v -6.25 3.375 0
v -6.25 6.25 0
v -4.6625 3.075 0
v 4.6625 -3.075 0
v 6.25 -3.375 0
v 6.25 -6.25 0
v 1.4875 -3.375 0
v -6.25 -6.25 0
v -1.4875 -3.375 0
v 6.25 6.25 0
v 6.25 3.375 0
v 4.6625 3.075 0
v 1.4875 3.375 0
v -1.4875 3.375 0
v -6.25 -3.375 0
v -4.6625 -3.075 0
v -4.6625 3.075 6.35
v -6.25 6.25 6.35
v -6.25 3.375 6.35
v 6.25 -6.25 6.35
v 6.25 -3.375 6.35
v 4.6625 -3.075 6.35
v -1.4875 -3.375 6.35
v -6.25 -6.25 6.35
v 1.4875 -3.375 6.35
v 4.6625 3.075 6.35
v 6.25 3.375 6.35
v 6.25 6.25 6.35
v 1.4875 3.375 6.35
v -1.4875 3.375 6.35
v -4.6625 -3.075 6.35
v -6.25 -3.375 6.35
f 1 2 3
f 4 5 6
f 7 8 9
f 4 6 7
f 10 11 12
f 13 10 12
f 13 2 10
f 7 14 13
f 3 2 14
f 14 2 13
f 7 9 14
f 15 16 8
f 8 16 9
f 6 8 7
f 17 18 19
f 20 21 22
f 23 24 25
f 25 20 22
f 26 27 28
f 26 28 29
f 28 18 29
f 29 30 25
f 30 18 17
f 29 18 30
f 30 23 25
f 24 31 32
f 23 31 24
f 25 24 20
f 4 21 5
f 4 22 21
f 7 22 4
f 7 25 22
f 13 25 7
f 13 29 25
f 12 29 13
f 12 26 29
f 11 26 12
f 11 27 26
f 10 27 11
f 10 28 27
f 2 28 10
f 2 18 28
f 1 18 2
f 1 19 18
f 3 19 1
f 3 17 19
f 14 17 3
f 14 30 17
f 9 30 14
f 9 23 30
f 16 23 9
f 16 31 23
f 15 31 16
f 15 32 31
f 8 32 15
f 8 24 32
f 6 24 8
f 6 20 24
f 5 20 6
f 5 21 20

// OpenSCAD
// file: ../lib/TOGUnitTable-v1.scad
// TOGUnitTable-v1.1.0 - Library for handling 'complex amounts' in the form of [multiplier, unit name], e.g. [1.5, "inch"]
//
// 2023-07-01: the following 'annotation' is something I just made up,
// but is intended as a way for future packaging tools to know that it's 'safe'
// (because everything has been somewhat namespaced) to turn a `use <x>`
// into an `include <x>`, making it inlinable:
// safe-to-include: true
// 
// Versions:
// v1.0.0:
// - Created it.
// v1.1.0:
// - Add optional 'dbgctxstr' parameter to unit decoding functions, for better error messages
// 
// Naming convention:
// Doing 'OO without classes', here.
// Fully qualified name = class or package name + "__" + member name
// Class or package name may itself be namespaced, and class names may double as package names.
// Here, tog_unittable names both a class and a package.

// Demo unit table uses 'micrometer' as the base unit
// in order to keep multipliers as integers as much as possible.
tog_unittable__demo_unit_table = [
	["um",    [    1   ,   "um"], "micrometer" ],
	["mm",    [ 1000   ,   "um"], "millimeter" ],
	["inch",  [25400   ,   "um"], "inch"       ],
	["u",     [    1/16, "inch"], "model unit" ], // As used by TGx9 et al
	["atom",  [    8   ,    "u"], "model atom" ],
	["chunk", [    3   , "atom"], "model chunk"],
];

use <./DbgCtxStrLib1.scad>

function tog_unittable__list__filter(list, predicate) = [
	for( item=list ) if( predicate(item) ) item
];
function tog_unittable__list__first(list, on_error) =
	len(list) > 0 ? list[0] : on_error();

function tog_unittable__unit_value_ca(unit_table, unit_name, dbgctxstr=undef) =
	tog_unittable__list__first(
		tog_unittable__list__filter(unit_table, function (entry) entry[0] == unit_name),
		function () assert(false,
			str("Did not find entry for unit '", unit_name, "' in unit table", dbgctxstr_errmsg_suffix(dbgctxstr))
		)
	)[1];

function tog_unittable__ca__is_valid( ca ) =
	is_list(ca) && len(ca) == 2;

// Break down 'amount' until it is in a base unit (one which is defined in terms of itself)
function tog_unittable__simplify_ca(unit_table, amount, dbgctxstr=undef) =
	assert( tog_unittable__ca__is_valid(amount), str(amount, " is not a valid Complex Amount (should be [numeric_value, \"unit_name\"])", dbgctxstr=dbgctxstr) )
	let( unit_value_ca = tog_unittable__unit_value_ca(unit_table, amount[1], dbgctxstr=dbgctxstr) )
	unit_value_ca[1] == amount[1] ? amount :
		tog_unittable__simplify_ca(unit_table, [amount[0] * unit_value_ca[0], unit_value_ca[1]]);

function tog_unittable__divide_ca(unit_table, numerator, denominator, dbgctxstr=undef) =
	let(
		numerator_base_ca   = tog_unittable__simplify_ca(unit_table, numerator, dbgctxstr=dbgctxstr),
		denominator_base_ca = tog_unittable__simplify_ca(unit_table, denominator, dbgctxstr=dbgctxstr)
	)
	assert(numerator_base_ca[1] == denominator_base_ca[1], str("Different base units found for ", numerator[1], " and ", denominator[1]))
	numerator_base_ca[0] / denominator_base_ca[0];	

assert(tog_unittable__divide_ca(tog_unittable__demo_unit_table, [1,   "mm"], [  1, "mm"]) ==     1   );
assert(tog_unittable__divide_ca(tog_unittable__demo_unit_table, [1,   "mm"], [  1, "um"]) ==  1000   );
assert(tog_unittable__divide_ca(tog_unittable__demo_unit_table, [1, "inch"], [  1, "um"]) == 25400   );
assert(tog_unittable__divide_ca(tog_unittable__demo_unit_table, [1, "inch"], [  1, "mm"]) ==    25.4 );
assert(tog_unittable__divide_ca(tog_unittable__demo_unit_table, [1, "inch"], [254, "um"]) ==   100   );
assert(tog_unittable__divide_ca(tog_unittable__demo_unit_table, [1,    "u"], [  1, "um"]) ==  1587.5 );
// file: ../lib/TOGStringLib1.scad
// TOGStringLib1.7
// 
// Functions for parsing quantities
// and other misc. string handling.
// 
// v1.5
// - togstr1_parse_quantity will treat unit-only strings as meaning 1/1 of that unit.
//   e.g. togstr1_parse_quantity("foot") = [[[1,1], "foot", 4]]
// v1.6:
// - togstr1_parse_quantity allows unit name to be omitted when quantity is zero and $togunits1_default_unit is defined
// v1.7:
// - Add optional 'dbgctxstr' parameter to unit decoding functions, for better error messages
// 
// Globals: $togunits1_default_unit - affects what 'unit' is returned
// when interpreting numbers or strings that lack the unit.


function togstr1__todo(message) = assert(false, str("TODO: ", message));

module togstr1__assert_eq(a, b) {
	if( a != b ) {
		assert( a == b, str(a, " != ", b) );
	}
}



function togstr1_slice(source, i0, i1) =
	i0 == i1 ? "" :
	str(source[i0], togstr1_slice(source, i0+1, i1));

function togstr1_tokenize(source, sep, maxcount=9999, i=0, tokenstart=0) =
	len(source) == i ? (
		(tokenstart < i) ? [togstr1_slice(source, tokenstart, i)] : []
	) :
	source[i] == sep ? (
		(tokenstart < i) ? concat([togstr1_slice(source, tokenstart, i)], togstr1_tokenize(source, sep, maxcount-1, i+1, i+1)) :
		togstr1_tokenize(source, sep, maxcount, i+1, i+1)
	) :
	maxcount <= 1 ? [togstr1_slice(source, tokenstart, len(source))] :
	togstr1_tokenize(source, sep, maxcount, i+1, tokenstart);

togstr1__assert_eq( ["foo","bar","baz"], togstr1_tokenize("foo-bar-baz", "-") );
// Duplicate delimiters are ignored
togstr1__assert_eq( ["foo","bar","baz"], togstr1_tokenize("foo--bar--baz", "-") );
// Trailing delimiters are ignored
togstr1__assert_eq( ["foo","bar","baz"], togstr1_tokenize("foo--bar--baz--", "-") );
// Leading delimiters are ignored
togstr1__assert_eq( ["foo","bar","baz"], togstr1_tokenize("--foo--bar--baz", "-") );
// Can limit number of tokens returned
togstr1__assert_eq( ["foo","bar-baz"], togstr1_tokenize("foo-bar-baz", "-", 2) );
togstr1__assert_eq( ["foo","bar-baz"], togstr1_tokenize("--foo--bar-baz", "-", 2) );
togstr1__assert_eq( ["foo","bar--baz"], togstr1_tokenize("--foo--bar--baz", "-", 2) );
togstr1__assert_eq( ["foo"], togstr1_tokenize("--foo--", "-", 2) );




/** \d+ -> [num, end_index] */
function togstr1_parse_decimal_nat(str, index=0, current=0, dbgctxstr=undef) =
	len(str) == index ? [current, index] :
	let( dig = ord(str[index]) - ord("0") )
	(dig >= 0 && dig <= 9) ? togstr1_parse_decimal_nat(str, index+1, current*10 + dig, dbgctxstr=dbgctxstr) :
	[current, index];

togstr1__assert_eq( [123,3], togstr1_parse_decimal_nat("123") );
togstr1__assert_eq( [123,3], togstr1_parse_decimal_nat("123.45") );

/** [+-]*\d+ ->  [[num, den], end_index] */
function togstr1_parse_decimal_number(str, index=0, dbgctxstr=undef) =
	str[index] == "+" ? togstr1_parse_decimal_number(str, index+1) :
	str[index] == "-" ? let(r=togstr1_parse_decimal_number(str, index+1)) [[-r[0][0], r[0][1]], r[1]] :
	let(r = togstr1_parse_decimal_nat(str, index, dbgctxstr=dbgctxstr))
	str[r[1]] != "." ? [[r[0], 1], r[1]] :
	let(fracr = togstr1_parse_decimal_nat(str, r[1]+1))
	let(mult = pow(10, fracr[1]-(r[1]+1)))
	[[r[0]*mult + fracr[0], mult], fracr[1]];

togstr1__assert_eq( [[   36,   1], 2], togstr1_parse_decimal_number( "36"   ) );
togstr1__assert_eq( [[ 3524, 100], 5], togstr1_parse_decimal_number( "35.24") );
togstr1__assert_eq( [[-3524, 100], 6], togstr1_parse_decimal_number("-35.24") );
togstr1__assert_eq( [[    0,   1], 0], togstr1_parse_decimal_number( "NotANumber") );

function togstr1__gcd(a, b) = b == 0 ? abs(a) : togstr1__gcd(b, a % b);

togstr1__assert_eq(10, togstr1__gcd(10, 20));
togstr1__assert_eq( 5, togstr1__gcd(10, 15));
togstr1__assert_eq( 2, togstr1__gcd(10, 14));


function togstr1__normalize_rat(rat) =
	let(gcd = togstr1__gcd(rat[0], rat[1]))
	// TODO: find LCD, divide top and bottom by it
	rat[0] < 0 && rat[1] < 0 ? [-rat[0]/gcd, -rat[1]/gcd] :
	[rat[0]/gcd, rat[1]/gcd];

/** <decnum>[/<decnum>] -> [[num, den], end_index] */
function togstr1__multiply_rat(a, b) =
	togstr1__normalize_rat(
		a[1] == b[1] ? [a[0]*b[0]/a[1], a[1]] : // TODO: LCD instead of special case
		[a[0]*b[0], a[1]*b[1]]
	);
function togstr1__divide_rat(a, b) = togstr1__normalize_rat([a[0]*b[1], a[1]*b[0]]);


function togstr1__add_rat(a, b) =
	togstr1__normalize_rat([a[0]*b[1] + b[0]*a[1], a[1]*b[1]]);
	
togstr1__assert_eq([1, 2], togstr1__add_rat([1, 3], [1, 6]));


/** Return [[num, den], end_index] */
function togstr1_parse_rational_number(str, index=0, dbgctxstr=undef) =
	let( numr = togstr1_parse_decimal_number(str, index, dbgctxstr=dbgctxstr) )
	str[numr[1]] == "+" ?
		let(numrb = togstr1_parse_rational_number(str, numr[1]+1, dbgctxstr=dbgctxstr))
		[togstr1__add_rat(numr[0], numrb[0]), numrb[1]]	:
	str[numr[1]] == "/" ?
		let( denr = togstr1_parse_decimal_number(str, numr[1]+1, dbgctxstr=dbgctxstr) )
		[togstr1__divide_rat(numr[0], denr[0]), denr[1]] :
	numr;

togstr1__assert_eq( [[   123,  1],3], togstr1_parse_rational_number( "123") );
togstr1__assert_eq( [[   123,  1],4], togstr1_parse_rational_number("+123") );
togstr1__assert_eq( [[-  123,  1],4], togstr1_parse_rational_number("-123") );
togstr1__assert_eq( [[   123,  1],6], togstr1_parse_rational_number("-+-123") );
togstr1__assert_eq( [[ 12345,100],6], togstr1_parse_rational_number("123.45") );
togstr1__assert_eq( [[  2469, 40],8], togstr1_parse_rational_number("123.45/2") );
togstr1__assert_eq( [[-  823,160],10], togstr1_parse_rational_number("-123.45/24") );
togstr1__assert_eq( [[     4,  3],5], togstr1_parse_rational_number( "1+1/3") );
togstr1__assert_eq( [[     0,  1],0], togstr1_parse_rational_number( "NotANumber!!") );


/** Return [[[num, den], unit], end_index] */
function togstr1_parse_quantity(str, dbgctxstr=undef) =
	let( numr = togstr1_parse_rational_number(str, dbgctxstr=dbgctxstr) )
	// For now, just let the unit be the rest of the string;
	// can revisit to stop at delimiters if needed in the future.
	numr[1] > 0 && numr[1] == len(str) && numr[0][0] == 0 && !is_undef($togunits1_default_unit) ? [[[0,1], $togunits1_default_unit], numr[1]] :
	assert( numr[1] < len(str), str("Quantity string missing unit: '", str, "'; note that '0' is acceptable if $togunits1_default_unit is defined"))
	let( unit = togstr1_slice(str, numr[1], len(str)) )
	let( quant = numr[1] > 0 ? numr[0] : [1,1] ) // No number = 1 (possibly this should be an error instead)
	[[quant, unit], len(str)];

togstr1__assert_eq( [[[  3,  1], "acre"],  5], togstr1_parse_quantity("3acre") );
togstr1__assert_eq( [[[  3,  5], "acre"],  7], togstr1_parse_quantity("3/5acre") );
togstr1__assert_eq( [[[301,500], "acre"], 10], togstr1_parse_quantity("3.01/5acre") );
togstr1__assert_eq( [[[  1,  1], "acre"],  4], togstr1_parse_quantity("acre") ); // Should either treat as one or throw an error!
togstr1__assert_eq( [[[  0,  1],"hectare"],1], togstr1_parse_quantity("0", $togunits1_default_unit="hectare") ); // Zero is fine if $togunits1_default_unit is defined
// file: ../lib/TOGridLib3.scad
// TOGridPileLib-v3.4
// 
// HOKAY WHAT ARE THE COMMON
// things that I want the library to do?
// 
// - [X] Be `include`-able, to make inlining easy
// - [X] Allow unit table to be overridden easily, but default by default
// - [ ] Support common configurations by name (e.g. "V9", or some "WSTYPE-...")
//   without having to pass 50 different parameters in
// - [ ] Support subtractions for those common configurations also,
//   such that you don't need to remember to 'do less rounding', etc.
// - [ ] Make a simple foot-only block that I can subtract stuff from
//   params: foot style
// - [ ] Make a block with a lip
// - [ ] Make a block foot, and I'll intersect it with some other things
// - [X] Translate a block_size_ca to mm
// 
// Changes:
// v3.1:
// - s/togridpile3_decode_size/togridpile3_decode_vector/
// v3.2:
// - togridpile3_decode(num) = num
// v3.3:
// - Change prefix from `togridpile3` to `togridlib3`
// v3.4:
// - Add optional 'dbgctxstr' parameter to unit decoding functions, for better error messages

use <../lib/TOGUnitTable-v1.scad>

function togridlib3_map(arr, fn) = [ for(item=arr) fn(item) ];

togridlib3_default_unit_table = [
	["um",    [    1,               "um"]],
	["mm",    [ 1000,               "um"]],
	["inch",  [25400,               "um"]],
	["u",     [    1.5875,          "mm"]],
	["atom",  [    8,                "u"]],
	["chunk", [    3,             "atom"]],
	["tgp-standard-bevel"   , [2,    "u"]], // Usuually 1/8"
	["m-outer-corner-radius", [4,    "u"]],
	["f-outer-corner-radius", [3,    "u"]],
];

function togridlib3_get_default_unit_table() = togridlib3_default_unit_table;
function togridlib3_get_unit_table() = is_undef($togridlib3_unit_table) ? togridlib3_default_unit_table : $togridlib3_unit_table;

function togridlib3_decode(dim, unit=[1, "mm"], unit_table=togridlib3_get_unit_table(), dbgctxstr=undef) =
	is_num(dim) ? dim : tog_unittable__divide_ca(unit_table, dim, unit, dbgctxstr=dbgctxstr);
function togridlib3_decode_vector(size, unit=[1, "mm"], unit_table=togridlib3_get_unit_table(), dbgctxstr=undef) =
	togridlib3_map(size, function(dim) is_num(dim) ? dim : tog_unittable__divide_ca(unit_table, dim, unit, dbgctxstr=dbgctxstr));

module togridlib3_cube(size, offset=0) {
	cube(togridlib3_decode_vector(size), center=true);
}
// file: ../lib/DbgCtxStrLib1.scad
// DbgCtxStrLib1.0
// 
// Library for dealing with 'debug context strings' (usually 'dbgctxstr').

function dbgctxstr_errmsg_suffix(dbgctxstr) =
	is_undef(dbgctxstr) || dbgctxstr == "" ? "" :
	str(" (", dbgctxstr, ")");
// file: ../lib/TOGArrayLib1.scad
// TOGArrayLib1.5
// 
// Functions for working with arrays.
// 
// v1.1:
// - tal1_reduce assert(is_list(items)) to prevent infinite recursion
//   when given undefined or other non-list values
// v1.1.1:
// - Fix tal1_uniq_remap_v2 to return "list-remap-result" as the
//   first element of the returned list
// v1.2:
// - Add tal1_replace_at function
// v1.3:
// - tal1_is_vec_of, tal1_is_vec_of_num
// v1.4:
// - tal1_assert_for_each, for when you want to assert something
//   about each of a list of items and get nice failure messages
// v1.5:
// - Add tal1_duplicate_reversed function, which may be
//   handy when generating symmetrical polygons and stuff.

/**
 * Make a list with the contents of list `a`,
 * but starting at offset `off`, replaced by the contents of list `b`.
 * len(result) = max(len(a), off+len(b))
 */
function tal1_replace_at(a, off, b, default_value=undef, default_value_function=undef) =
	assert(is_list(a))
	assert(is_list(b))
	let( _dvf = !is_undef(default_value_function) ? default_value_function : function(i) default_value )
[
	for( i=[0:1:min(off,len(a))-1] ) a[i],
	for( i=[len(a):1:off-1] ) _dvf(i),
	for( i=[off:1:off+len(b)-1] ) b[i-off],
	for( i=[off+len(b):1:len(a)-1] ) a[i],
];

// Simplest case
assert([] == tal1_replace_at([], 0, []));
// Second simplest cases
assert(["foo"] == tal1_replace_at(["foo"], 0, []));
assert(["foo"] == tal1_replace_at([], 0, ["foo"]));
// Replace one item
assert(["foo","quux","baz"] == tal1_replace_at(["foo","bar","baz"], 1, ["quux"]));
// Replace and extend
assert(["foo","quux","tuna","tina"] == tal1_replace_at(["foo","bar","baz"], 1, ["quux", "tuna", "tina"]));
// Add beyond end of `a`
assert(["foo","zzz","quux"] == tal1_replace_at(["foo"], 2, ["quux"], default_value="zzz"));
// Adding 'nothing' should still fill to that point with defaults
assert(["foo","zzz","zzz"] == tal1_replace_at(["foo"], 3, [], default_value="zzz"));


function tal1_reduce(start, items, func, offset=0) =
	assert(is_list(items))
	len(items) == offset ? start :
	tal1_reduce(func(start, items[offset]), items, func, offset+1);

function tal1_consecutive_duplicate_count(items) = tal1_reduce(
	[0, undef],
	items,
	function(z,item) [z[0] + (item == z[1] ? 1 : 0), item]
)[0];

assert(0 == tal1_consecutive_duplicate_count([]));
assert(0 == tal1_consecutive_duplicate_count([50]));
assert(1 == tal1_consecutive_duplicate_count([50,50]));
assert(0 == tal1_consecutive_duplicate_count([50,51,52,53]));
assert(1 == tal1_consecutive_duplicate_count([50,51,52,52]));
assert(3 == tal1_consecutive_duplicate_count([50,50,50,50]));

// Set test_size to arbirarily large values
// to ensure that OpenSCAD can handle heavy recursion
let(test_size=1000) assert(test_size/2 == tal1_consecutive_duplicate_count([for(i=[0:1:test_size-1]) floor(i/2)]));



function tal1_uniq_(items, off0, off1) =
	let(chunklen = off1-off0)
	chunklen == 0 ? [] :
	chunklen == 1 ? [items[off0]] :
	let(half=floor(chunklen/2))
	let(left  = tal1_uniq_(items, off0     , off0+half))
	let(right = tal1_uniq_(items, off0+half, off1     ))
	assert(len(left) > 0)
	assert(len(right) > 0)
	left[len(left)-1] == right[0] ? [each left, for(i=[1:1:len(right)-1]) right[i]] :
	[each left, each right];

/** Given a list of items, returns a new list with identical consecutive items merged */
function tal1_uniq(items) = tal1_uniq_(items, 0, len(items));

assert([] == tal1_uniq([]));
assert([123] == tal1_uniq([123]));
assert([55,0,1,2,3] == tal1_uniq([55,0,1,2,3]));
assert([55,0,1,2] == tal1_uniq([55,0,1,1,2]));
assert([55,0,1] == tal1_uniq([55,55,0,0,0,0,0,0,1,1,1,1]));
assert([55,0] == tal1_uniq([55,0,0,0,0,0,0,0]));



/**
 * Returns [new items, old index -> new index mapping].
 * No-op version.
 */
function tal1_uniq_remap_v1(items) =
	["list-remap-result", items, [for (vi=[0:1:len(items)-1]) vi]];

// [a, a, b, b, c, c]
//
// [a,    ...], []  -> [a],[0]
// [a, a, ...], [0] -> [a],[0,0]

assert([1,2,3] == [1,2,3]);

/**
 * Recursive version that will combine adjacent identical vertexes,
 * but will use the original items.
 */
function tal1_uniq_remap_v2(items, map=[]) =
	let(index = len(map))
	len(items) == index ? ["list-remap-result", items, map] :
	index == 0 ? tal1_uniq_remap_v2(items, [0]) :
	items[index] == items[map[index-1]] ? tal1_uniq_remap_v2(items, [for(vi=map) vi, map[index-1]]) :
	tal1_uniq_remap_v2(items, [for(vi=map) vi, index]);

assert(tal1_uniq_remap_v2([1,1,2,2,3,4]) == ["list-remap-result", [1,1,2,2,3,4], [0,0,2,2,4,5]]);


/**
 * Returns true if `vec` is a list of at least min_len items
 * and component_check(each item, even those beyond min_len) is true.
 */
function tal1_is_vec_of(vec, min_len=0, component_check=function(x) true) =
	assert(is_num(min_len) && min_len >= 0)
	assert(is_function(component_check))
	is_list(vec) && len(vec) >= min_len &&
	tal1_reduce(true, vec, function(prev,item) prev && component_check(item));

function tal1_is_vec_of_num(vec, min_len=0) = tal1_is_vec_of(vec, min_len, function(i) is_num(i));

assert( true == tal1_is_vec_of_num([1,2,3]));
assert( true == tal1_is_vec_of_num([]));
assert( true == tal1_is_vec_of_num([1,2,3], 3));
assert(false == tal1_is_vec_of_num([1,2], 3));
assert(false == tal1_is_vec_of_num([1,2,"spoon"], 3));
// Requirements are ambiguous when
// first min_len items are numbers, but there are non-numeric items afterwards,
// so let's error on the side of saying 'no, it's not a list of numbers';
// i.e. the item check and the min_len are independent.
assert(false == tal1_is_vec_of_num([1,2,3,"artichoke"], 3));


/**
 * Asserts that item_checker(each item in list, index of item)[0] is true.
 * Second element of item_checker return value is assertion message.
 * Returns the original list, in case that's useful to you.
 */
function tal1_assert_for_each(list, item_checker) =
	let( _ignored = [ for(i=[0:1:len(list)-1])
		let(q=item_checker(list[i],i))
		let(passed=is_bool(q) ? q : is_list(q) ? q[0] : assert(false, str(
			"tal1_assert_for_each: item_checker should return Bool|[Bool,String], but returned ",
			q, " for item at index ", i)))
		let(message=is_list(q) ? q[1] : undef)
		assert(passed, message)
		q
	])
	list;

// Callback can return a boolean...
assert([1,2,3] == tal1_assert_for_each([1,2,3], function(v,i) is_num(v)));
// ...or a [boolean, string]
assert([1,2,3] == tal1_assert_for_each([1,2,3], function(v,i) [is_num(v), "element be a num"]));

// [a, b, c] -> [a, b, c, rxf(c), rxf(b), rxf(a)]
function tal1_duplicate_reversed(list, rxf=function(item) item) =
	[
		each list,
		for( i=[len(list)-1 : -1 : 0] ) rxf(list[i]),
	];
// file: ../lib/TOGUnits1.scad
// TOGUnits1.7
// 
// For simlifying quantity parsing and unit conversion
// 
// v1.1:
// - Add `togunits1_decode` function
// v1.2:
// - Add togunits1_decode_vec
// v1.3:
// - Add togunits1_vec_to_cas
// v1.4:
// - Add togunits1_vec_to_mms
// v1.5:
// - Remove unused `unit` parameter from `togunits1_vec_to_cas`
// v1.6:
// - togunits1_decode accepts `xf` parameter, same as togunits1_decode_vec
// v1.7:
// - Add optional 'dbgctxstr' parameter to unit decoding functions, for better error messages
// 
// Reserved but not-yet-actually-used globals:
// - $togunits1_default_unit - default unit when interpreting "0"
//   - See TOGStringLib1
// - $togunits1_default_implied_unit - when interpreting quantities without unit, assume they have this one
//   - This might be a bad idea, so never implemented!

use <./DbgCtxStrLib1.scad>
use <./TOGridLib3.scad>
use <./TOGStringLib1.scad>

function togunits1__is_ca(what) =
	is_list(what) && len(what) == 2 && is_num(what[0]) && is_string(what[1]);

function togunits1__parse_to_ca(what, dbgctxstr=undef) =
	assert( is_string(what) )
	let( parseresult = togstr1_parse_quantity(what, dbgctxstr) )
	assert( parseresult[1] > 0, str("Failed to parse quantity from  ", what, dbgctxstr=dbgctxstr) )
	let( parsed = parseresult[0] )
	let( rat = parsed[0] )
	let( unit = parsed[1] )
	[rat[0]/rat[1], unit];

function togunits1_to_ca(what, dbgctxstr=undef) =
	is_string(what) ? togunits1__parse_to_ca(what, dbgctxstr=dbgctxstr) :
	togunits1__is_ca(what) ? what :
	is_num(what) ? [what, "mm"] :
	assert(false, str("Unrecognized quantity representation: ", what));

function togunits1_vec_to_cas(whats) =
	[for(w=whats) togunits1_to_ca(w)];

function togunits1__get_transform(name) =
	is_function(name) ? name :
	is_undef(name) ? function(n) n :
	name == "round" ? function(n) round(n) :
	name == "ceil" ? function(n) ceil(n) :
	assert(false, str("Unrecognized transform: '", name, "'"));

function togunits1_decode(what, unit=[1,"mm"], xf=undef, dbgctxstr=undef) =
	let( ca = togunits1_to_ca(what, dbgctxstr=dbgctxstr) )
	let( xf1 = togunits1__get_transform(xf) )
	xf1(togridlib3_decode(ca, unit=togunits1_to_ca(unit), dbgctxstr=dbgctxstr));

function togunits1_decode_vec(whats, unit=[1,"mm"], xf=undef) =
	let( unit_ca = togunits1_to_ca(unit) )
	let( xf1 = togunits1__get_transform(xf) )
	[for(w=whats) xf1(togunits1_decode(w, unit_ca))];

function togunits1_to_mm(what, dbgctxstr=undef) = togunits1_decode(what, [1,"mm"], dbgctxstr=dbgctxstr);
function togunits1_vec_to_mms(what) = togunits1_decode_vec(what, [1,"mm"]);
// file: ../lib/TOGMod1Constructors.scad
// TOGMod1Constructors-v1.11
// 
// Functions to construct objects understood by TOGMod1
// 
// v1.1:
// - Add togmod1_make_rounded_rect
// v1.2:
// - togmod1_make_rounded_rect can make ovals
// v1.3:
// - togmod1_circle_points, to just get the points of a circle
// - if pos parameter to circle function has a third element,
//   returned vertexes will include it as the z component;
// v1.3.1
// - Some assertions
// v1.4:
// - Refactor togmod1_rounded_rect_points and togmod1_circle_points
//   to use togmod1__make_nd_vector_adder for adapting to whatever
//   `pos` parameter is.
// v1.5:
// - togmod_rounded_rect_points will not simplify completely rounded sides
//   (where length of side is exactly twice the rounding radius)
//   unless simplify_rounded_sides=true
//   - This makes it more useful for polyhedron generation,
//     where radius varies, but number of points must remain constant.
// v1.6:
// - togmod1_make_rect makes a simple rectangle
// - togmod1_make_rounded_rect will defer to togmod1_make_rect when r=0
// v1.7:
// - togmod1_make_circle will return empty shape (["union"]) when d=0
// v1.8:
// - Add togmod1_text
// v1.9:
// - togmod1_circle_points uses 3 as minimum circle point count instead of 6
// v1.10:
// - Fix togmod1_linear_extrude_y so that range corresponds to Y start/end and
//   polygon X,Y correspond to X,Z.  Previously it was rotated wrongly,
//   which would have gone unnoticed for symmetrical shapes centered at 0,0.
// v1.11:
// - Remove an 'echo'

use <./TOGArrayLib1.scad>

function togmod1__make_nd_vector_adder(origin=[0,0]) =
	let(origin_is_zero = tal1_reduce(true, origin, function(prev,item) prev && item == 0))
	origin_is_zero ? (function(vec) len(vec) >= len(origin) ? vec : tal1_replace_at(origin, 0, vec)) :
	function(vec) [
		for(i=[0:1:max(len(origin),len(vec))-1]) (len(vec) > i ? vec[i] : 0) + (len(origin) > i ? origin[i] : 0),
	];

assert([1,2,3] == togmod1__make_nd_vector_adder()([1,2,3]));
assert([1,2,3] == togmod1__make_nd_vector_adder([0,0,3])([1,2]));


function togmod1_make_cuboid(size) =
	assert(is_list(size))
	assert(len(size) >= 3)
	assert(is_num(size[0]))
	assert(is_num(size[1]))
	assert(is_num(size[2]))
	["polyhedron-vf", [
		[-size[0]/2, -size[1]/2, -size[2]/2],
		[+size[0]/2, -size[1]/2, -size[2]/2],
		[-size[0]/2, +size[1]/2, -size[2]/2],
		[+size[0]/2, +size[1]/2, -size[2]/2],
		[-size[0]/2, -size[1]/2, +size[2]/2],
		[+size[0]/2, -size[1]/2, +size[2]/2],
		[-size[0]/2, +size[1]/2, +size[2]/2],
		[+size[0]/2, +size[1]/2, +size[2]/2]
	], [
		[0,1,3,2],[0,4,5,1],[4,6,7,5],[3,7,6,2],[1,5,7,3],[6,4,0,2]
	]];

function togmod1_make_polygon(verts) =
	["polygon-vp", verts, [[for( i=[0:1:len(verts)-1] ) i%len(verts)]]];

function togmod1_rounded_rect_points(size, r, pos=[0,0], simplify_rounded_sides=false) =
	assert(is_list(size))
	assert(len(size) >= 2)
	let(radii = is_list(r) ? r : is_num(r) ? [r,r] : assert(false, "rounded_rect r(adius) should be list<num> or num"))
	let(rx = radii[0])
	let(ry = radii[1])
	assert(is_num(rx))
	assert(is_num(ry))
	assert(size[0] >= 2*rx, str("size[0] must be >= 2*r[0]; size[0] = ",size[0],", 2*r[0] = ",2*rx))
	assert(size[1] >= 2*ry, str("size[1] must be >= 2*r[1]; size[1] = ",size[1],", 2*r[1] = ",2*ry))
	let(quarterfn=max($fn/4, 1))
	let(qfnx = simplify_rounded_sides && size[0] == 2*rx ? quarterfn-1 : quarterfn)
	let(qfny = simplify_rounded_sides && size[1] == 2*ry ? quarterfn-1 : quarterfn)
	let(finalizepos = togmod1__make_nd_vector_adder(pos))
[
	for(a=[0 : 1 : qfnx]) let(ang=      a*90/quarterfn) finalizepos([ size[0]/2-rx + rx*cos(ang),  size[1]/2-ry + ry*sin(ang)]),
	for(a=[0 : 1 : qfny]) let(ang= 90 + a*90/quarterfn) finalizepos([-size[0]/2+rx + rx*cos(ang),  size[1]/2-ry + ry*sin(ang)]),
	for(a=[0 : 1 : qfnx]) let(ang=180 + a*90/quarterfn) finalizepos([-size[0]/2+rx + rx*cos(ang), -size[1]/2+ry + ry*sin(ang)]),
	for(a=[0 : 1 : qfny]) let(ang=270 + a*90/quarterfn) finalizepos([ size[0]/2-rx + rx*cos(ang), -size[1]/2+ry + ry*sin(ang)]),
];

function togmod1_make_rect(size) =
	togmod1_make_polygon([
		[-size[0]/2, -size[1]/2],
		[+size[0]/2, -size[1]/2],
		[+size[0]/2, +size[1]/2],
		[-size[0]/2, +size[1]/2],
	]);

function togmod1_make_rounded_rect(size, r) =
	r == 0 ? togmod1_make_rect(size) :
	togmod1_make_polygon(togmod1_rounded_rect_points(size,r,simplify_rounded_sides=true));

/**
 * Returns points for an approximation of a circle where points are at distance r from pos.
 * Can be used to make other regular polygons, but the faces will be less than that
 * distance from pos (do some trig if you want face distance, e.g. for a hex nut).
 */
function togmod1_circle_points(r, pos=[0,0], d=undef) =
	assert( !is_undef(r) || !is_undef(d) )
	assert(!is_undef(pos[0]))
	assert(!is_undef(pos[1]))
	let(finalizepos = togmod1__make_nd_vector_adder(pos))
	let(r_ = !is_undef(r) ? r : d/2)
	let(fn = max($fn, 3))
	[for(i=[0 : 1 : fn-1]) finalizepos([r_*cos(i*360/fn), r_*sin(i*360/fn)])];

function togmod1_make_circle(r, pos=[0,0], d=undef) =
	r == 0 || d == 0 ? ["union"] :
	togmod1_make_polygon(togmod1_circle_points(r=r, pos=pos, d=d));

function togmod1_make_cylinder(d, zrange=[0,1], r=undef, pos=[0,0]) =
	assert( !is_undef(r) || !is_undef(d) )
	let( r_ = !is_undef(r) ? r : d/2 )
	// TODO: Make polyhedron directly
	["linear-extrude-zs", zrange, togmod1_make_circle(r=r_, pos=pos)];

function togmod1__is_range1d(range) = is_list(range) && len(range) == 2 && is_num(range[0]) && is_num(range[1]);

function togmod1_linear_extrude_z(range, shape) =
	assert(togmod1__is_range1d(range))
	["linear-extrude-zs", range, shape];
function togmod1_linear_extrude_x(range, shape) =
	assert(togmod1__is_range1d(range))
	["rotate", [90, 0, 90], togmod1_linear_extrude_z(range, shape)];
function togmod1_linear_extrude_y(range, shape) =
	assert(togmod1__is_range1d(range))
	["rotate", [90, 0,  0], togmod1_linear_extrude_z([-range[1], -range[0]], shape)];

function togmod1_text(text, size, font, halign, valign, spacing, direction, language, script) =
	["text-tsfhvsdls", text, size, font, halign, valign, spacing, direction, language, script];
// file: ../lib/TOGMod1.scad
// TOGMod1.9
// OpenSCAD library for representing shapes
// 
// See also: Functional OpenSCAD (https://github.com/thehans/FunctionalOpenSCAD)
// 
// v1.8:
// - Add `text-tsfhvsdls`
// v1.9
// - Add `offset-ds` (offset with _d_elta a _s_hape)

module togmod1_domodule(mod) {
	assert(is_list(mod));
	assert(len(mod) > 0);
	if( mod[0] == "polygon-vp" ) {
		// ["polygon-vp", vertexes, paths]
		polygon(points=mod[1], paths=mod[2]);
	} else if( mod[0] == "polyhedron-vf" ) {
		polyhedron(mod[1], faces=mod[2]);
	} else if( mod[0] == "scale" ) {
		assert(len(mod) == 3);
		scale(mod[1]) togmod1_domodule(mod[2]);
	} else if( mod[0] == "translate" ) {
		assert(len(mod) == 3);
		assert(is_list(mod[1]));
		for(c=mod[1]) assert(is_num(c), "translate component should be numeric");
		translate(mod[1]) togmod1_domodule(mod[2]);
	} else if( mod[0] == "rotate" ) {
		assert(len(mod) == 3);
		rotate(mod[1]) togmod1_domodule(mod[2]);
	} else if( mod[0] == "intersection" ) {
		intersection_for( i=[1:1:len(mod)-1] ) togmod1_domodule(mod[i]);
	} else if( mod[0] == "difference" ) {
		difference() {
			togmod1_domodule(mod[1]);
			for( i=[2:1:len(mod)-1] ) togmod1_domodule(mod[i]);
		}
	} else if( mod[0] == "union" ) {
		for( i=[1:1:len(mod)-1] ) togmod1_domodule(mod[i]);
	} else if( mod[0] == "hull" ) {
		hull() for( i=[1:1:len(mod)-1] ) togmod1_domodule(mod[i]);
	} else if( mod[0] == "offset-rs" ) {
		assert(len(mod) == 3);
		assert(is_num(mod[1]));
		assert(is_list(mod[2]));
		offset(mod[1]) togmod1_domodule(mod[2]);
	} else if( mod[0] == "linear-extrude-zs" ) {
		// ["linear-extrude-zs", [z0,z1], 2d_shape] // centered
		// ["linear-extrude-zs", height, 2d_shape]
		let( zrange = is_list(mod[1]) ? mod[1] : [-mod[1]/2, mod[1]/2] ) {
			translate([0,0,zrange[0]]) linear_extrude(zrange[1]-zrange[0]) togmod1_domodule(mod[2]);
		}
	} else if( mod[0] == "render" ) {
		render() togmod1_domodule(mod[1]);
	} else if( mod[0] == "minkowski" ) {
		minkowski() {
			togmod1_domodule(mod[1]);
			togmod1_domodule(mod[2]);
		}
	} else if( mod[0] == "x-debug" ) {
		# togmod1_domodule(mod[1]);
	} else if( mod[0] == "x-color" ) {
		color(mod[1]) togmod1_domodule(mod[2]);
	} else if( mod[0] == "text-tsfhvsdls" ) {
		text(text=mod[1], size=mod[2], font=mod[3], halign=mod[4], valign=mod[5], spacing=mod[6], direction=mod[7], language=mod[7], script=mod[8]);
	} else if( mod[0] == "offset-ds" ) {
		assert(is_num(mod[1]));
		assert(is_list(mod[2]));
		offset(delta=mod[1]) togmod1_domodule(mod[2]);
	} else {
		assert(false, str("Unrecognized shape: ", mod[0]));
	}
}
// main file
// SmallPanelClip0.1
// 
// Clip for holding small panels, like TOGRack2 panels, together

//panel_thickness = "4u";
//panel_gap = "2u";
width = "4u";

module smallpanelclip0__end_params() { }

use <../lib/TOGMod1.scad>
use <../lib/TOGMod1Constructors.scad>
use <../lib/TOGUnits1.scad>

function reverse_list(list, mapping=function(item) item) = [for(i=[len(list)-1 : -1 : 0]) mapping(list[i])];

function mirror_points_r_to_l(points) = reverse_list(points, function(p) [-p[0],  p[1]]);
function mirror_points_t_to_b(points) = reverse_list(points, function(p) [ p[0], -p[1]]);

function extrapolate_tr(points) =
	let( top = [each points, each mirror_points_r_to_l(points)] )
	[each top, each mirror_points_t_to_b(top)];

u = 254/160;

width_mm = togunits1_to_mm(width);

togmod1_domodule(togmod1_linear_extrude_z([0,width_mm],togmod1_make_polygon(extrapolate_tr([
	[1*u - 0.1, 2*u+0.2],
	[3*u - 0.1, 2*u-0.1],
	[4*u - 0.1, 2*u+0.2],
	[4*u - 0.1, 4*u-0.1],
]))));
